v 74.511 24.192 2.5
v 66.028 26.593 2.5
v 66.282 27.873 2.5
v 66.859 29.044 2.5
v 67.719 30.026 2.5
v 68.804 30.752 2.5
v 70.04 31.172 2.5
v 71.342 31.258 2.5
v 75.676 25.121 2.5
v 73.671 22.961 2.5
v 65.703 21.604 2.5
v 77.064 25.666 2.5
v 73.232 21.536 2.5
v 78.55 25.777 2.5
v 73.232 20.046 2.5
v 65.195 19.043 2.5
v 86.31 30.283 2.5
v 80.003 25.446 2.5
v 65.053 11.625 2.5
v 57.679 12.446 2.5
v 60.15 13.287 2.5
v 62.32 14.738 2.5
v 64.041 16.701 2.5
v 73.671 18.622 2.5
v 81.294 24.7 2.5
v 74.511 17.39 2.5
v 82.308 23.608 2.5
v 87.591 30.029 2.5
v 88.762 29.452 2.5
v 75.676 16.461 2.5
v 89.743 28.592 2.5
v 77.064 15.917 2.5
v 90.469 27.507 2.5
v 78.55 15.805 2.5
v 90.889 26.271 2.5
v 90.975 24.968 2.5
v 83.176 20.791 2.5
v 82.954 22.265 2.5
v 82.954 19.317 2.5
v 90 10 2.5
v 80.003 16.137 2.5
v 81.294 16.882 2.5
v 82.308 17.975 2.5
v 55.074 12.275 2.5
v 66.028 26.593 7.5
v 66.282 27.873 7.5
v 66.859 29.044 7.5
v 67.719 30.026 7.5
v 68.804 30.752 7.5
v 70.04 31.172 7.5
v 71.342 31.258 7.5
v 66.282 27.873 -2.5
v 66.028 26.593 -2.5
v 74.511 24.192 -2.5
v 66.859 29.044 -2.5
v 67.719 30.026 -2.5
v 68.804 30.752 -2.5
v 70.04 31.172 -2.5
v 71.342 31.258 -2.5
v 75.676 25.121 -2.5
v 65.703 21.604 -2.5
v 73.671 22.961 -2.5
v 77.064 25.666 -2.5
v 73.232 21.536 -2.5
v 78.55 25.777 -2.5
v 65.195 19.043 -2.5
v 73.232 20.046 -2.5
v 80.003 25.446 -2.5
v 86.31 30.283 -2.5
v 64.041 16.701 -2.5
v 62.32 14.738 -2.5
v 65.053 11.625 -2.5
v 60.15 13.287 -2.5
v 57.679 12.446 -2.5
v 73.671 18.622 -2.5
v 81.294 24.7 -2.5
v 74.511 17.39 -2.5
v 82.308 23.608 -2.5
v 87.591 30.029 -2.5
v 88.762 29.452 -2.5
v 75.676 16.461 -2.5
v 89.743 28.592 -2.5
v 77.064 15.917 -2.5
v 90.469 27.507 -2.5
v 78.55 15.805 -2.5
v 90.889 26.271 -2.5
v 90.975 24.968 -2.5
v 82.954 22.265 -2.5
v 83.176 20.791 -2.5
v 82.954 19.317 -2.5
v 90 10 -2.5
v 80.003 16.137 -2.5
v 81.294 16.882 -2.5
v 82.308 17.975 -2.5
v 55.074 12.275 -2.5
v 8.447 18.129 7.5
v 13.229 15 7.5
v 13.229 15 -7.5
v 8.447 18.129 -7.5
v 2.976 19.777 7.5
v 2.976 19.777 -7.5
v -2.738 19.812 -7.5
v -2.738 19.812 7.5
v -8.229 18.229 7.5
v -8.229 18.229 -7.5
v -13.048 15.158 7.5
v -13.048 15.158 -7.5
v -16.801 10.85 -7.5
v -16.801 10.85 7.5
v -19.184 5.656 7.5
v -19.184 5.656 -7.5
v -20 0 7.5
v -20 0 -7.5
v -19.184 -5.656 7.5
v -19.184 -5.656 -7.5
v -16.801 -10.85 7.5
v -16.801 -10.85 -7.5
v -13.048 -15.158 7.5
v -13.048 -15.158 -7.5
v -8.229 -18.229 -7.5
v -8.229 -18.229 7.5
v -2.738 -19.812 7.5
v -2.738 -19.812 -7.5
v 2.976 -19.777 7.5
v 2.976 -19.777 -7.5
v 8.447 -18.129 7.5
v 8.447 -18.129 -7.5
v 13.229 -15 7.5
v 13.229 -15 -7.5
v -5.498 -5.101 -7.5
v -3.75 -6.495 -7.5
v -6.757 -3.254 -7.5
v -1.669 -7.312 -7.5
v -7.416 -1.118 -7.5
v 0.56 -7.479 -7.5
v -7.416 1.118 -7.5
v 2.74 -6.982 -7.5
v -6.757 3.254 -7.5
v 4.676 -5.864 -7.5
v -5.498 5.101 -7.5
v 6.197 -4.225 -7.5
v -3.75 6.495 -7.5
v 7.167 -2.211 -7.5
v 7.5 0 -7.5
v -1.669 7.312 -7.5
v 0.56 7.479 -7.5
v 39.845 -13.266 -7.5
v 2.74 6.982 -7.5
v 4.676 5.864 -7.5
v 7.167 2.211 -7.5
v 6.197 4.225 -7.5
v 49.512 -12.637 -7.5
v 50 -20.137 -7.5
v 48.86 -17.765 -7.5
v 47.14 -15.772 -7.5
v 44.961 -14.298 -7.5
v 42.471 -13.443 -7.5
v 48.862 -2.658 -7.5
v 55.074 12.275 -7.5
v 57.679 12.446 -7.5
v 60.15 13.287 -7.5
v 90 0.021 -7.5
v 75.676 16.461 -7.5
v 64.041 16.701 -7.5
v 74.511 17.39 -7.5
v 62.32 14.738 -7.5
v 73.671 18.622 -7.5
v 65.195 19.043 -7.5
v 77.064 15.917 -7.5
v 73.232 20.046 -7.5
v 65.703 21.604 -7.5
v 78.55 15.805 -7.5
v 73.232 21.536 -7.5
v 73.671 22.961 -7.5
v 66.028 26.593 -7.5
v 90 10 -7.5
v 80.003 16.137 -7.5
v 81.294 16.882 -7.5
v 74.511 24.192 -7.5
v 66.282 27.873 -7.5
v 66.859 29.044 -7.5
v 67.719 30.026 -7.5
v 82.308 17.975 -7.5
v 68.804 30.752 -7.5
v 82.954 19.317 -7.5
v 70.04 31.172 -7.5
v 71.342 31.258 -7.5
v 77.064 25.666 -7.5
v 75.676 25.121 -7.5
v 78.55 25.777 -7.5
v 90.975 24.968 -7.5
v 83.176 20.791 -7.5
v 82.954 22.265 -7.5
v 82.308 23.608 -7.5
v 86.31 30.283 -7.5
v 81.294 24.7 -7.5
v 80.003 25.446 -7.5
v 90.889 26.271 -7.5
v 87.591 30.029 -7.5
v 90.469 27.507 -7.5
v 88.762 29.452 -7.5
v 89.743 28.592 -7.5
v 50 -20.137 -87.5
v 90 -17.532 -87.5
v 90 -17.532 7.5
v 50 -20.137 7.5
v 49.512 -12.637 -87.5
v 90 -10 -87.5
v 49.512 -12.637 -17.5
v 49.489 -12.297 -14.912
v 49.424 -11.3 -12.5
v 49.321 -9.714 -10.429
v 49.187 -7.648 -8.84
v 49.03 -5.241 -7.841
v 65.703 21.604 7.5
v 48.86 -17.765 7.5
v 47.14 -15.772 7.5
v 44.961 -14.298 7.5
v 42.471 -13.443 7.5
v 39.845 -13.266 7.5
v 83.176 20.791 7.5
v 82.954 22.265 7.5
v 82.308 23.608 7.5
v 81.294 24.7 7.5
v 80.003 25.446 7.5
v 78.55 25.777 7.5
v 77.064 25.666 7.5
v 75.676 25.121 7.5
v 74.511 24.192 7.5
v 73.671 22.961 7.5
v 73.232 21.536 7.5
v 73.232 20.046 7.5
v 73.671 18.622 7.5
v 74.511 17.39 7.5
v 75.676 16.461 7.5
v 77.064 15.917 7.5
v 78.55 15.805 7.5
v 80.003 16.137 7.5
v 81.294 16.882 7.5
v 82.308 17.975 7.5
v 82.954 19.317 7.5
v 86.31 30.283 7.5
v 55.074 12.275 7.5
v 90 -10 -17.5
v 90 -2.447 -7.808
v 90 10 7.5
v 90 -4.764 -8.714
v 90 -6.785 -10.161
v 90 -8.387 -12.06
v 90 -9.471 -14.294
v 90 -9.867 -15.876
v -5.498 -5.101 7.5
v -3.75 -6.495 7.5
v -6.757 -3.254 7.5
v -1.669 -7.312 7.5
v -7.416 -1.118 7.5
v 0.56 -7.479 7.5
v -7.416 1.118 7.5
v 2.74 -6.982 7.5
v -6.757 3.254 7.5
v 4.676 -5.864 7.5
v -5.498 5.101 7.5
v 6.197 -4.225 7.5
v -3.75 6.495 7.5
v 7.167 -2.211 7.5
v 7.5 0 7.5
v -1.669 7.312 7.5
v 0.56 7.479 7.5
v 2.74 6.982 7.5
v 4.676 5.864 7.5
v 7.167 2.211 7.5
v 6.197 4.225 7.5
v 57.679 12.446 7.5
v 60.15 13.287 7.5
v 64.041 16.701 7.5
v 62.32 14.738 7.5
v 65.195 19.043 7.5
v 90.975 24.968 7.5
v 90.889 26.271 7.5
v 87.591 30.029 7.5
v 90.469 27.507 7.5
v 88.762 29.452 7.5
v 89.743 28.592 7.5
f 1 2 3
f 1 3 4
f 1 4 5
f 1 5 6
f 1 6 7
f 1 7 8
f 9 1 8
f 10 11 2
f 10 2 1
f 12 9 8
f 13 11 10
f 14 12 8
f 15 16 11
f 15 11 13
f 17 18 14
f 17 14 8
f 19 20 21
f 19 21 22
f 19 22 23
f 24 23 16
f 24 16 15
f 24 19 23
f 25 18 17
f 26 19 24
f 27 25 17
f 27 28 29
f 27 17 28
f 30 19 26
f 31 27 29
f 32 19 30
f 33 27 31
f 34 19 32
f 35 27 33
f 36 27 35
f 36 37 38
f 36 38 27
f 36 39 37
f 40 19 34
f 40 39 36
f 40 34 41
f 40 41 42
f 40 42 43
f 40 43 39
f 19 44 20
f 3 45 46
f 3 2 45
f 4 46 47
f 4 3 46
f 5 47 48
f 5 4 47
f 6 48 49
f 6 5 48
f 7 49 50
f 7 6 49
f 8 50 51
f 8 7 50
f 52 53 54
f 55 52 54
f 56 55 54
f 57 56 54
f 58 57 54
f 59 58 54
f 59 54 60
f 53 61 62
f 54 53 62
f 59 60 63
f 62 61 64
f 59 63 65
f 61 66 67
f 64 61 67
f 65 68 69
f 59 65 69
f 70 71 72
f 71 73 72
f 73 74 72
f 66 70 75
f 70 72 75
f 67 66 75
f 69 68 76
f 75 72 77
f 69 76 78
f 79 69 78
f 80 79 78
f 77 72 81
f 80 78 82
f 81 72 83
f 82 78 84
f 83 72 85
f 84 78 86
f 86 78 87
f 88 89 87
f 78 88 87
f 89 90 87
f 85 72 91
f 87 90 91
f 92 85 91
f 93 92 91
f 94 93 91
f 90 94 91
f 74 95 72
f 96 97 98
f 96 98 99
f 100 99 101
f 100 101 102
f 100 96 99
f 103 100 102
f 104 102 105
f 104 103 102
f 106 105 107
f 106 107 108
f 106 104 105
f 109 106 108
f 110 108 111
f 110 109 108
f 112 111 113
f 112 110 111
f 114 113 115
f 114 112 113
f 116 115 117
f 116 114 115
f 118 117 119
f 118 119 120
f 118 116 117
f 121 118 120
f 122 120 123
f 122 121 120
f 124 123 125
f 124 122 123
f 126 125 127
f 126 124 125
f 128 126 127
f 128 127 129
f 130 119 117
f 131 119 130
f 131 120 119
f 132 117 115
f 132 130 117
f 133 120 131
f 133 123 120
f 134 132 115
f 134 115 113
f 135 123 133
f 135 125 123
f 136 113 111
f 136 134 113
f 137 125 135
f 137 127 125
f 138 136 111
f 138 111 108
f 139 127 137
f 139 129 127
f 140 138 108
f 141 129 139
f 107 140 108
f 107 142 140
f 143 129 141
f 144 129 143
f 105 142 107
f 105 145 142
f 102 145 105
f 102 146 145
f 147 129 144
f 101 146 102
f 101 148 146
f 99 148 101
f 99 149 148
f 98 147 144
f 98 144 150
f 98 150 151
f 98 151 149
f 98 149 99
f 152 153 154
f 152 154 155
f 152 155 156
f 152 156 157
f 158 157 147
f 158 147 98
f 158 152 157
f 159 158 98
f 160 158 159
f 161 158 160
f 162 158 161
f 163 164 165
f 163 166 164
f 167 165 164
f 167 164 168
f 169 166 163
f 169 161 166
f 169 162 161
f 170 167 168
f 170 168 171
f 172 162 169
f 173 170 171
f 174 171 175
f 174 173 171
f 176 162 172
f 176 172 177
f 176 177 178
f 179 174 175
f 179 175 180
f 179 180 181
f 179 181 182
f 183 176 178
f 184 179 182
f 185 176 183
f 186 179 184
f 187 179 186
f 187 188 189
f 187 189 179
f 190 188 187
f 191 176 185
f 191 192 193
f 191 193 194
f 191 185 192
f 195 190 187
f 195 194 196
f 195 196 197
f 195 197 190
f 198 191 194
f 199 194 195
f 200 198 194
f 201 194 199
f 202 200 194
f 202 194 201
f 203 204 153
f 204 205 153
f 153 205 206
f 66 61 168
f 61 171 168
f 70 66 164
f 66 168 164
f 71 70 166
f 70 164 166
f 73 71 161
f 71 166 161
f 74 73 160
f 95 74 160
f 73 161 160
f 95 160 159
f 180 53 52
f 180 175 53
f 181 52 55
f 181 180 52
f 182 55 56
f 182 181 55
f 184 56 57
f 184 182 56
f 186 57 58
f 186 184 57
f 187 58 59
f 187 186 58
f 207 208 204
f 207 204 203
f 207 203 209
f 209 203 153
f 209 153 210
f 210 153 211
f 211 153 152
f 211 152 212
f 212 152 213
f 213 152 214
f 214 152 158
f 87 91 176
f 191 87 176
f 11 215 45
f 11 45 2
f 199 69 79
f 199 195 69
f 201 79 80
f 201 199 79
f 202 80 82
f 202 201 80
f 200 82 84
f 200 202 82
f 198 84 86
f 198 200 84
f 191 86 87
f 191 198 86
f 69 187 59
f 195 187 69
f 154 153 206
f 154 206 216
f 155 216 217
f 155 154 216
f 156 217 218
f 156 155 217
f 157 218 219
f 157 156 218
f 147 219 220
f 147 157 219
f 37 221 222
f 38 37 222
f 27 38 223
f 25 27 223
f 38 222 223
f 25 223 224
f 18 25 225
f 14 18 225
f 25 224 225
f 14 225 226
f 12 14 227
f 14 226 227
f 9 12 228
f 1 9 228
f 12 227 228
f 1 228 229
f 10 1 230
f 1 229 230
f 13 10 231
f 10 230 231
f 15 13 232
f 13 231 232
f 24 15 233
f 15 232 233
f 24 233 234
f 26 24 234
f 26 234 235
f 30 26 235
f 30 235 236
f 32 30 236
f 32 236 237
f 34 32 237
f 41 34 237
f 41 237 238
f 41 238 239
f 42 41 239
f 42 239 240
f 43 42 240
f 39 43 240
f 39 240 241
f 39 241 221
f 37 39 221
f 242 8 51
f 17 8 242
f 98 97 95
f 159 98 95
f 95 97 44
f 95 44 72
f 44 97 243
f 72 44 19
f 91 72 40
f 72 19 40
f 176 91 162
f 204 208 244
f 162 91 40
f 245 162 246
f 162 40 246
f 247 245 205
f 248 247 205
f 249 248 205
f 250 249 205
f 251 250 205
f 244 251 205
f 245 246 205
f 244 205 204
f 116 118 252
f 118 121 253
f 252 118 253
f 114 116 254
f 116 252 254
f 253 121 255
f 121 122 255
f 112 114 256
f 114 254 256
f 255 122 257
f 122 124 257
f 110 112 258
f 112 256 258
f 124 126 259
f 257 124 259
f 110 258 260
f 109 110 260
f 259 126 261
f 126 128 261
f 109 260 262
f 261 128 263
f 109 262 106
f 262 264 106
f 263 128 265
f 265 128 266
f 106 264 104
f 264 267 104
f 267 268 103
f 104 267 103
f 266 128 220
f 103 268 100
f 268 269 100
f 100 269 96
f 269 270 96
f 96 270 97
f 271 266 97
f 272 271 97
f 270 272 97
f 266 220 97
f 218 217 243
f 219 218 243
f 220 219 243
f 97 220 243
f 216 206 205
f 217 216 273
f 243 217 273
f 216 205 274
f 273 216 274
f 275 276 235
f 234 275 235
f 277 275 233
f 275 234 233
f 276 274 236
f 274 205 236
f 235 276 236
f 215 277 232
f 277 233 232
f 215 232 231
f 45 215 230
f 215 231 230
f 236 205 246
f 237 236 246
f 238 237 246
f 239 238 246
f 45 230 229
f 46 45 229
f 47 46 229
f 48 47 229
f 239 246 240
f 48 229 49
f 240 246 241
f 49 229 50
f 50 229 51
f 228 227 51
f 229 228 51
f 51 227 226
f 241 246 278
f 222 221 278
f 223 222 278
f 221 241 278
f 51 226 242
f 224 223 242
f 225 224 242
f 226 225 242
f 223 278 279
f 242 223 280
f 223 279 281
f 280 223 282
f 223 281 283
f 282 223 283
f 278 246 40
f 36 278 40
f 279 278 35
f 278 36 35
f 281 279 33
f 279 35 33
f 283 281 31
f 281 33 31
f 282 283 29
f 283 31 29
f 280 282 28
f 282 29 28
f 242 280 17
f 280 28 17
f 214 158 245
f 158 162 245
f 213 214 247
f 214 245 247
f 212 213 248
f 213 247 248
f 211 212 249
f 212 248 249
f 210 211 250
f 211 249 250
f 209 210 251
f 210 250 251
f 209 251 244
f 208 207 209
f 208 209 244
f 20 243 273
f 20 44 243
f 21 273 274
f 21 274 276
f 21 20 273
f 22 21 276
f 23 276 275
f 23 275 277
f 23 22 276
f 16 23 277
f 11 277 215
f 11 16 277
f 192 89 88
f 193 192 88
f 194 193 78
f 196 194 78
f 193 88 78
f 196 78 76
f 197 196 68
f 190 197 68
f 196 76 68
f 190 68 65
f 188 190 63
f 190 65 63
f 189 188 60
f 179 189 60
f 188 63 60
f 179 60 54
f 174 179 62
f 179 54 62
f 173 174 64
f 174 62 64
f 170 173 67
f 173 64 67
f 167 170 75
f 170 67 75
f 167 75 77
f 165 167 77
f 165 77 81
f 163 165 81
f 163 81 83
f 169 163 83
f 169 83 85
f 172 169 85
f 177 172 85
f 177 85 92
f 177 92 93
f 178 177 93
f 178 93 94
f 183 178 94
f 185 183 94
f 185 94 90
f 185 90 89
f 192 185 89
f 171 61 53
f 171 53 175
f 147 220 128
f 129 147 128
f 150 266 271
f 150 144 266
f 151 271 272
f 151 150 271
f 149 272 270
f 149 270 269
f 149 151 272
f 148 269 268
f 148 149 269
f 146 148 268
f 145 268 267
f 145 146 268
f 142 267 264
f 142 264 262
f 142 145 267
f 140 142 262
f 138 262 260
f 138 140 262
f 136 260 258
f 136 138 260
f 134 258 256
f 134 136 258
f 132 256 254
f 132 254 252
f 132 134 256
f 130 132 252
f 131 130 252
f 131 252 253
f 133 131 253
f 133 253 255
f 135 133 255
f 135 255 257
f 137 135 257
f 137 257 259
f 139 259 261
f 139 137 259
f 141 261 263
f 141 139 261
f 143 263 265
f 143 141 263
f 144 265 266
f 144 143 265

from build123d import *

# Parameters (mm, degrees)
SKETCH1_R                       = 20
SKETCH1_R_2                     = 7.5
BOSS_EXTRUDE1_DEPTH             = 7.5
BOSS_EXTRUDE2_DEPTH             = 7.5
SKETCH4_W                       = 25
SKETCH4_H                       = 5
BOSS_EXTRUDE3_DEPTH             = 20
SKETCH5_R                       = 5
CUT_EXTRUDE1_DEPTH              = 98.765588134
FILLET1_R                       = 5
FILLET2_R                       = 10
BOSS_EXTRUDE4_REACH             = 99.371
BOSS_EXTRUDE4_DIRECTION_2_DEPTH = 80
FILLET3_R                       = 10
FILLET4_R                       = 10


with BuildPart() as part:
    # Sketch1 → Boss-Extrude1 (new, symmetric)
    with BuildSketch(Plane.XY):
        Circle(SKETCH1_R)
        Circle(SKETCH1_R_2, mode=Mode.SUBTRACT)
    extrude(amount=BOSS_EXTRUDE1_DEPTH, both=True)

    # Sketch2 → Boss-Extrude2 (add, symmetric)
    with BuildSketch(Plane.XY):
        with BuildLine():
            Line((13.228756555, 15), (90, 10))
            Line((90, 10), (90, -10))
            Line((90, -10), (13.228756555, -15))
            ThreePointArc((13.228756555, -15), (20, 0), (13.228756555, 15))
        make_face()
    extrude(amount=BOSS_EXTRUDE2_DEPTH, both=True)

    # Sketch4 → Boss-Extrude3 (add)
    with BuildSketch(Plane(origin=(1.028677717, 15.794573482, 0), x_dir=(0.9978858591262095, -0.06499086209573432, 0), z_dir=(0.06499086209573432, 0.9978858591262095, 0))):
        with Locations((76.6598187, 5)):
            Rectangle(SKETCH4_W, SKETCH4_H)
        with Locations((76.6598187, -5)):
            Rectangle(SKETCH4_W, SKETCH4_H)
    extrude(amount=BOSS_EXTRUDE3_DEPTH)

    # Sketch5 → Cut-Extrude1 (cut, through all)
    with BuildSketch(Plane.XY.offset(7.5)):
        with Locations((78.176335382, 20.791244367)):
            Circle(SKETCH5_R)
    extrude(amount=-CUT_EXTRUDE1_DEPTH, mode=Mode.SUBTRACT)

    # Fillet1
    fillet1_edges = [part.edges().sort_by_distance(p)[0] for p in [
        (66.352670764, 31.582488735, -5),
        (91.299817242, 29.957717183, -5),
        (66.352670764, 31.582488735, 5),
        (91.299817242, 29.957717183, 5),
    ]]
    fillet(fillet1_edges, radius=FILLET1_R)

    # Fillet2
    fillet2_edges = [part.edges().sort_by_distance(p)[0] for p in [
        (65.052853522, 11.624771552, -5),
        (65.052853522, 11.624771552, 5),
    ]]
    fillet(fillet2_edges, radius=FILLET2_R)

    # Boss-Extrude4: up to this face of the body (flat: up to its plane)
    boss_extrude4_end = Plane(part.part.faces().sort_by_distance((38.09502008, 2.657537248, 7.5))[0])
    # Sketch6 → Boss-Extrude4 (add, up to the picked face)
    with BuildSketch(Plane(origin=(0, 0, -7.5), x_dir=(-1, 0, 0), z_dir=(0, 0, -1)), mode=Mode.PRIVATE) as boss_extrude4_sk1:
        Polygon((-90, -10), (-90, -17.531812963), (-50, -20.136955084), (-49.511535852, -12.636955084), align=None)
    boss_extrude4_tool1 = split(extrude(boss_extrude4_sk1.sketch, amount=-BOSS_EXTRUDE4_REACH, mode=Mode.PRIVATE), bisect_by=boss_extrude4_end, keep=Keep.BOTH, mode=Mode.PRIVATE)
    add(boss_extrude4_tool1.solids().sort_by(Axis((69.877637, -15.068829, -7.5), (0, 0, 1)))[0])

    # Sketch6 → Boss-Extrude4 direction 2 (add)
    with BuildSketch(Plane(origin=(0, 0, -7.5), x_dir=(-1, 0, 0), z_dir=(0, 0, -1))):
        Polygon((-90, -10), (-90, -17.531812963), (-50, -20.136955084), (-49.511535852, -12.636955084), align=None)
    extrude(amount=BOSS_EXTRUDE4_DIRECTION_2_DEPTH)

    # Fillet3
    # the kernel refuses this fillet: 10 mm, written as the material it adds along each edge
    with BuildSketch(Plane(origin=(49.511535852, -12.636955084, -7.5), x_dir=(0.06499086209573703, -0.9978858591262094, 0), z_dir=(0, 0, 1))) as fillet3_piece_1:
        with BuildLine():
            CenterArc((10, -9.686547154), FILLET3_R, 104.383505331, 75.616494669)
            Line((0, -9.686547154), (0, 0))
            Line((0, 0), (7.51588965, 0))
        make_face()
    extrude(amount=15)

    # Fillet4
    fillet4_edges = [part.edges().sort_by_distance(p)[0] for p in [
        (69.755767926, -11.318477542, -7.5),
    ]]
    fillet(fillet4_edges, radius=FILLET4_R)


solid = part.part
